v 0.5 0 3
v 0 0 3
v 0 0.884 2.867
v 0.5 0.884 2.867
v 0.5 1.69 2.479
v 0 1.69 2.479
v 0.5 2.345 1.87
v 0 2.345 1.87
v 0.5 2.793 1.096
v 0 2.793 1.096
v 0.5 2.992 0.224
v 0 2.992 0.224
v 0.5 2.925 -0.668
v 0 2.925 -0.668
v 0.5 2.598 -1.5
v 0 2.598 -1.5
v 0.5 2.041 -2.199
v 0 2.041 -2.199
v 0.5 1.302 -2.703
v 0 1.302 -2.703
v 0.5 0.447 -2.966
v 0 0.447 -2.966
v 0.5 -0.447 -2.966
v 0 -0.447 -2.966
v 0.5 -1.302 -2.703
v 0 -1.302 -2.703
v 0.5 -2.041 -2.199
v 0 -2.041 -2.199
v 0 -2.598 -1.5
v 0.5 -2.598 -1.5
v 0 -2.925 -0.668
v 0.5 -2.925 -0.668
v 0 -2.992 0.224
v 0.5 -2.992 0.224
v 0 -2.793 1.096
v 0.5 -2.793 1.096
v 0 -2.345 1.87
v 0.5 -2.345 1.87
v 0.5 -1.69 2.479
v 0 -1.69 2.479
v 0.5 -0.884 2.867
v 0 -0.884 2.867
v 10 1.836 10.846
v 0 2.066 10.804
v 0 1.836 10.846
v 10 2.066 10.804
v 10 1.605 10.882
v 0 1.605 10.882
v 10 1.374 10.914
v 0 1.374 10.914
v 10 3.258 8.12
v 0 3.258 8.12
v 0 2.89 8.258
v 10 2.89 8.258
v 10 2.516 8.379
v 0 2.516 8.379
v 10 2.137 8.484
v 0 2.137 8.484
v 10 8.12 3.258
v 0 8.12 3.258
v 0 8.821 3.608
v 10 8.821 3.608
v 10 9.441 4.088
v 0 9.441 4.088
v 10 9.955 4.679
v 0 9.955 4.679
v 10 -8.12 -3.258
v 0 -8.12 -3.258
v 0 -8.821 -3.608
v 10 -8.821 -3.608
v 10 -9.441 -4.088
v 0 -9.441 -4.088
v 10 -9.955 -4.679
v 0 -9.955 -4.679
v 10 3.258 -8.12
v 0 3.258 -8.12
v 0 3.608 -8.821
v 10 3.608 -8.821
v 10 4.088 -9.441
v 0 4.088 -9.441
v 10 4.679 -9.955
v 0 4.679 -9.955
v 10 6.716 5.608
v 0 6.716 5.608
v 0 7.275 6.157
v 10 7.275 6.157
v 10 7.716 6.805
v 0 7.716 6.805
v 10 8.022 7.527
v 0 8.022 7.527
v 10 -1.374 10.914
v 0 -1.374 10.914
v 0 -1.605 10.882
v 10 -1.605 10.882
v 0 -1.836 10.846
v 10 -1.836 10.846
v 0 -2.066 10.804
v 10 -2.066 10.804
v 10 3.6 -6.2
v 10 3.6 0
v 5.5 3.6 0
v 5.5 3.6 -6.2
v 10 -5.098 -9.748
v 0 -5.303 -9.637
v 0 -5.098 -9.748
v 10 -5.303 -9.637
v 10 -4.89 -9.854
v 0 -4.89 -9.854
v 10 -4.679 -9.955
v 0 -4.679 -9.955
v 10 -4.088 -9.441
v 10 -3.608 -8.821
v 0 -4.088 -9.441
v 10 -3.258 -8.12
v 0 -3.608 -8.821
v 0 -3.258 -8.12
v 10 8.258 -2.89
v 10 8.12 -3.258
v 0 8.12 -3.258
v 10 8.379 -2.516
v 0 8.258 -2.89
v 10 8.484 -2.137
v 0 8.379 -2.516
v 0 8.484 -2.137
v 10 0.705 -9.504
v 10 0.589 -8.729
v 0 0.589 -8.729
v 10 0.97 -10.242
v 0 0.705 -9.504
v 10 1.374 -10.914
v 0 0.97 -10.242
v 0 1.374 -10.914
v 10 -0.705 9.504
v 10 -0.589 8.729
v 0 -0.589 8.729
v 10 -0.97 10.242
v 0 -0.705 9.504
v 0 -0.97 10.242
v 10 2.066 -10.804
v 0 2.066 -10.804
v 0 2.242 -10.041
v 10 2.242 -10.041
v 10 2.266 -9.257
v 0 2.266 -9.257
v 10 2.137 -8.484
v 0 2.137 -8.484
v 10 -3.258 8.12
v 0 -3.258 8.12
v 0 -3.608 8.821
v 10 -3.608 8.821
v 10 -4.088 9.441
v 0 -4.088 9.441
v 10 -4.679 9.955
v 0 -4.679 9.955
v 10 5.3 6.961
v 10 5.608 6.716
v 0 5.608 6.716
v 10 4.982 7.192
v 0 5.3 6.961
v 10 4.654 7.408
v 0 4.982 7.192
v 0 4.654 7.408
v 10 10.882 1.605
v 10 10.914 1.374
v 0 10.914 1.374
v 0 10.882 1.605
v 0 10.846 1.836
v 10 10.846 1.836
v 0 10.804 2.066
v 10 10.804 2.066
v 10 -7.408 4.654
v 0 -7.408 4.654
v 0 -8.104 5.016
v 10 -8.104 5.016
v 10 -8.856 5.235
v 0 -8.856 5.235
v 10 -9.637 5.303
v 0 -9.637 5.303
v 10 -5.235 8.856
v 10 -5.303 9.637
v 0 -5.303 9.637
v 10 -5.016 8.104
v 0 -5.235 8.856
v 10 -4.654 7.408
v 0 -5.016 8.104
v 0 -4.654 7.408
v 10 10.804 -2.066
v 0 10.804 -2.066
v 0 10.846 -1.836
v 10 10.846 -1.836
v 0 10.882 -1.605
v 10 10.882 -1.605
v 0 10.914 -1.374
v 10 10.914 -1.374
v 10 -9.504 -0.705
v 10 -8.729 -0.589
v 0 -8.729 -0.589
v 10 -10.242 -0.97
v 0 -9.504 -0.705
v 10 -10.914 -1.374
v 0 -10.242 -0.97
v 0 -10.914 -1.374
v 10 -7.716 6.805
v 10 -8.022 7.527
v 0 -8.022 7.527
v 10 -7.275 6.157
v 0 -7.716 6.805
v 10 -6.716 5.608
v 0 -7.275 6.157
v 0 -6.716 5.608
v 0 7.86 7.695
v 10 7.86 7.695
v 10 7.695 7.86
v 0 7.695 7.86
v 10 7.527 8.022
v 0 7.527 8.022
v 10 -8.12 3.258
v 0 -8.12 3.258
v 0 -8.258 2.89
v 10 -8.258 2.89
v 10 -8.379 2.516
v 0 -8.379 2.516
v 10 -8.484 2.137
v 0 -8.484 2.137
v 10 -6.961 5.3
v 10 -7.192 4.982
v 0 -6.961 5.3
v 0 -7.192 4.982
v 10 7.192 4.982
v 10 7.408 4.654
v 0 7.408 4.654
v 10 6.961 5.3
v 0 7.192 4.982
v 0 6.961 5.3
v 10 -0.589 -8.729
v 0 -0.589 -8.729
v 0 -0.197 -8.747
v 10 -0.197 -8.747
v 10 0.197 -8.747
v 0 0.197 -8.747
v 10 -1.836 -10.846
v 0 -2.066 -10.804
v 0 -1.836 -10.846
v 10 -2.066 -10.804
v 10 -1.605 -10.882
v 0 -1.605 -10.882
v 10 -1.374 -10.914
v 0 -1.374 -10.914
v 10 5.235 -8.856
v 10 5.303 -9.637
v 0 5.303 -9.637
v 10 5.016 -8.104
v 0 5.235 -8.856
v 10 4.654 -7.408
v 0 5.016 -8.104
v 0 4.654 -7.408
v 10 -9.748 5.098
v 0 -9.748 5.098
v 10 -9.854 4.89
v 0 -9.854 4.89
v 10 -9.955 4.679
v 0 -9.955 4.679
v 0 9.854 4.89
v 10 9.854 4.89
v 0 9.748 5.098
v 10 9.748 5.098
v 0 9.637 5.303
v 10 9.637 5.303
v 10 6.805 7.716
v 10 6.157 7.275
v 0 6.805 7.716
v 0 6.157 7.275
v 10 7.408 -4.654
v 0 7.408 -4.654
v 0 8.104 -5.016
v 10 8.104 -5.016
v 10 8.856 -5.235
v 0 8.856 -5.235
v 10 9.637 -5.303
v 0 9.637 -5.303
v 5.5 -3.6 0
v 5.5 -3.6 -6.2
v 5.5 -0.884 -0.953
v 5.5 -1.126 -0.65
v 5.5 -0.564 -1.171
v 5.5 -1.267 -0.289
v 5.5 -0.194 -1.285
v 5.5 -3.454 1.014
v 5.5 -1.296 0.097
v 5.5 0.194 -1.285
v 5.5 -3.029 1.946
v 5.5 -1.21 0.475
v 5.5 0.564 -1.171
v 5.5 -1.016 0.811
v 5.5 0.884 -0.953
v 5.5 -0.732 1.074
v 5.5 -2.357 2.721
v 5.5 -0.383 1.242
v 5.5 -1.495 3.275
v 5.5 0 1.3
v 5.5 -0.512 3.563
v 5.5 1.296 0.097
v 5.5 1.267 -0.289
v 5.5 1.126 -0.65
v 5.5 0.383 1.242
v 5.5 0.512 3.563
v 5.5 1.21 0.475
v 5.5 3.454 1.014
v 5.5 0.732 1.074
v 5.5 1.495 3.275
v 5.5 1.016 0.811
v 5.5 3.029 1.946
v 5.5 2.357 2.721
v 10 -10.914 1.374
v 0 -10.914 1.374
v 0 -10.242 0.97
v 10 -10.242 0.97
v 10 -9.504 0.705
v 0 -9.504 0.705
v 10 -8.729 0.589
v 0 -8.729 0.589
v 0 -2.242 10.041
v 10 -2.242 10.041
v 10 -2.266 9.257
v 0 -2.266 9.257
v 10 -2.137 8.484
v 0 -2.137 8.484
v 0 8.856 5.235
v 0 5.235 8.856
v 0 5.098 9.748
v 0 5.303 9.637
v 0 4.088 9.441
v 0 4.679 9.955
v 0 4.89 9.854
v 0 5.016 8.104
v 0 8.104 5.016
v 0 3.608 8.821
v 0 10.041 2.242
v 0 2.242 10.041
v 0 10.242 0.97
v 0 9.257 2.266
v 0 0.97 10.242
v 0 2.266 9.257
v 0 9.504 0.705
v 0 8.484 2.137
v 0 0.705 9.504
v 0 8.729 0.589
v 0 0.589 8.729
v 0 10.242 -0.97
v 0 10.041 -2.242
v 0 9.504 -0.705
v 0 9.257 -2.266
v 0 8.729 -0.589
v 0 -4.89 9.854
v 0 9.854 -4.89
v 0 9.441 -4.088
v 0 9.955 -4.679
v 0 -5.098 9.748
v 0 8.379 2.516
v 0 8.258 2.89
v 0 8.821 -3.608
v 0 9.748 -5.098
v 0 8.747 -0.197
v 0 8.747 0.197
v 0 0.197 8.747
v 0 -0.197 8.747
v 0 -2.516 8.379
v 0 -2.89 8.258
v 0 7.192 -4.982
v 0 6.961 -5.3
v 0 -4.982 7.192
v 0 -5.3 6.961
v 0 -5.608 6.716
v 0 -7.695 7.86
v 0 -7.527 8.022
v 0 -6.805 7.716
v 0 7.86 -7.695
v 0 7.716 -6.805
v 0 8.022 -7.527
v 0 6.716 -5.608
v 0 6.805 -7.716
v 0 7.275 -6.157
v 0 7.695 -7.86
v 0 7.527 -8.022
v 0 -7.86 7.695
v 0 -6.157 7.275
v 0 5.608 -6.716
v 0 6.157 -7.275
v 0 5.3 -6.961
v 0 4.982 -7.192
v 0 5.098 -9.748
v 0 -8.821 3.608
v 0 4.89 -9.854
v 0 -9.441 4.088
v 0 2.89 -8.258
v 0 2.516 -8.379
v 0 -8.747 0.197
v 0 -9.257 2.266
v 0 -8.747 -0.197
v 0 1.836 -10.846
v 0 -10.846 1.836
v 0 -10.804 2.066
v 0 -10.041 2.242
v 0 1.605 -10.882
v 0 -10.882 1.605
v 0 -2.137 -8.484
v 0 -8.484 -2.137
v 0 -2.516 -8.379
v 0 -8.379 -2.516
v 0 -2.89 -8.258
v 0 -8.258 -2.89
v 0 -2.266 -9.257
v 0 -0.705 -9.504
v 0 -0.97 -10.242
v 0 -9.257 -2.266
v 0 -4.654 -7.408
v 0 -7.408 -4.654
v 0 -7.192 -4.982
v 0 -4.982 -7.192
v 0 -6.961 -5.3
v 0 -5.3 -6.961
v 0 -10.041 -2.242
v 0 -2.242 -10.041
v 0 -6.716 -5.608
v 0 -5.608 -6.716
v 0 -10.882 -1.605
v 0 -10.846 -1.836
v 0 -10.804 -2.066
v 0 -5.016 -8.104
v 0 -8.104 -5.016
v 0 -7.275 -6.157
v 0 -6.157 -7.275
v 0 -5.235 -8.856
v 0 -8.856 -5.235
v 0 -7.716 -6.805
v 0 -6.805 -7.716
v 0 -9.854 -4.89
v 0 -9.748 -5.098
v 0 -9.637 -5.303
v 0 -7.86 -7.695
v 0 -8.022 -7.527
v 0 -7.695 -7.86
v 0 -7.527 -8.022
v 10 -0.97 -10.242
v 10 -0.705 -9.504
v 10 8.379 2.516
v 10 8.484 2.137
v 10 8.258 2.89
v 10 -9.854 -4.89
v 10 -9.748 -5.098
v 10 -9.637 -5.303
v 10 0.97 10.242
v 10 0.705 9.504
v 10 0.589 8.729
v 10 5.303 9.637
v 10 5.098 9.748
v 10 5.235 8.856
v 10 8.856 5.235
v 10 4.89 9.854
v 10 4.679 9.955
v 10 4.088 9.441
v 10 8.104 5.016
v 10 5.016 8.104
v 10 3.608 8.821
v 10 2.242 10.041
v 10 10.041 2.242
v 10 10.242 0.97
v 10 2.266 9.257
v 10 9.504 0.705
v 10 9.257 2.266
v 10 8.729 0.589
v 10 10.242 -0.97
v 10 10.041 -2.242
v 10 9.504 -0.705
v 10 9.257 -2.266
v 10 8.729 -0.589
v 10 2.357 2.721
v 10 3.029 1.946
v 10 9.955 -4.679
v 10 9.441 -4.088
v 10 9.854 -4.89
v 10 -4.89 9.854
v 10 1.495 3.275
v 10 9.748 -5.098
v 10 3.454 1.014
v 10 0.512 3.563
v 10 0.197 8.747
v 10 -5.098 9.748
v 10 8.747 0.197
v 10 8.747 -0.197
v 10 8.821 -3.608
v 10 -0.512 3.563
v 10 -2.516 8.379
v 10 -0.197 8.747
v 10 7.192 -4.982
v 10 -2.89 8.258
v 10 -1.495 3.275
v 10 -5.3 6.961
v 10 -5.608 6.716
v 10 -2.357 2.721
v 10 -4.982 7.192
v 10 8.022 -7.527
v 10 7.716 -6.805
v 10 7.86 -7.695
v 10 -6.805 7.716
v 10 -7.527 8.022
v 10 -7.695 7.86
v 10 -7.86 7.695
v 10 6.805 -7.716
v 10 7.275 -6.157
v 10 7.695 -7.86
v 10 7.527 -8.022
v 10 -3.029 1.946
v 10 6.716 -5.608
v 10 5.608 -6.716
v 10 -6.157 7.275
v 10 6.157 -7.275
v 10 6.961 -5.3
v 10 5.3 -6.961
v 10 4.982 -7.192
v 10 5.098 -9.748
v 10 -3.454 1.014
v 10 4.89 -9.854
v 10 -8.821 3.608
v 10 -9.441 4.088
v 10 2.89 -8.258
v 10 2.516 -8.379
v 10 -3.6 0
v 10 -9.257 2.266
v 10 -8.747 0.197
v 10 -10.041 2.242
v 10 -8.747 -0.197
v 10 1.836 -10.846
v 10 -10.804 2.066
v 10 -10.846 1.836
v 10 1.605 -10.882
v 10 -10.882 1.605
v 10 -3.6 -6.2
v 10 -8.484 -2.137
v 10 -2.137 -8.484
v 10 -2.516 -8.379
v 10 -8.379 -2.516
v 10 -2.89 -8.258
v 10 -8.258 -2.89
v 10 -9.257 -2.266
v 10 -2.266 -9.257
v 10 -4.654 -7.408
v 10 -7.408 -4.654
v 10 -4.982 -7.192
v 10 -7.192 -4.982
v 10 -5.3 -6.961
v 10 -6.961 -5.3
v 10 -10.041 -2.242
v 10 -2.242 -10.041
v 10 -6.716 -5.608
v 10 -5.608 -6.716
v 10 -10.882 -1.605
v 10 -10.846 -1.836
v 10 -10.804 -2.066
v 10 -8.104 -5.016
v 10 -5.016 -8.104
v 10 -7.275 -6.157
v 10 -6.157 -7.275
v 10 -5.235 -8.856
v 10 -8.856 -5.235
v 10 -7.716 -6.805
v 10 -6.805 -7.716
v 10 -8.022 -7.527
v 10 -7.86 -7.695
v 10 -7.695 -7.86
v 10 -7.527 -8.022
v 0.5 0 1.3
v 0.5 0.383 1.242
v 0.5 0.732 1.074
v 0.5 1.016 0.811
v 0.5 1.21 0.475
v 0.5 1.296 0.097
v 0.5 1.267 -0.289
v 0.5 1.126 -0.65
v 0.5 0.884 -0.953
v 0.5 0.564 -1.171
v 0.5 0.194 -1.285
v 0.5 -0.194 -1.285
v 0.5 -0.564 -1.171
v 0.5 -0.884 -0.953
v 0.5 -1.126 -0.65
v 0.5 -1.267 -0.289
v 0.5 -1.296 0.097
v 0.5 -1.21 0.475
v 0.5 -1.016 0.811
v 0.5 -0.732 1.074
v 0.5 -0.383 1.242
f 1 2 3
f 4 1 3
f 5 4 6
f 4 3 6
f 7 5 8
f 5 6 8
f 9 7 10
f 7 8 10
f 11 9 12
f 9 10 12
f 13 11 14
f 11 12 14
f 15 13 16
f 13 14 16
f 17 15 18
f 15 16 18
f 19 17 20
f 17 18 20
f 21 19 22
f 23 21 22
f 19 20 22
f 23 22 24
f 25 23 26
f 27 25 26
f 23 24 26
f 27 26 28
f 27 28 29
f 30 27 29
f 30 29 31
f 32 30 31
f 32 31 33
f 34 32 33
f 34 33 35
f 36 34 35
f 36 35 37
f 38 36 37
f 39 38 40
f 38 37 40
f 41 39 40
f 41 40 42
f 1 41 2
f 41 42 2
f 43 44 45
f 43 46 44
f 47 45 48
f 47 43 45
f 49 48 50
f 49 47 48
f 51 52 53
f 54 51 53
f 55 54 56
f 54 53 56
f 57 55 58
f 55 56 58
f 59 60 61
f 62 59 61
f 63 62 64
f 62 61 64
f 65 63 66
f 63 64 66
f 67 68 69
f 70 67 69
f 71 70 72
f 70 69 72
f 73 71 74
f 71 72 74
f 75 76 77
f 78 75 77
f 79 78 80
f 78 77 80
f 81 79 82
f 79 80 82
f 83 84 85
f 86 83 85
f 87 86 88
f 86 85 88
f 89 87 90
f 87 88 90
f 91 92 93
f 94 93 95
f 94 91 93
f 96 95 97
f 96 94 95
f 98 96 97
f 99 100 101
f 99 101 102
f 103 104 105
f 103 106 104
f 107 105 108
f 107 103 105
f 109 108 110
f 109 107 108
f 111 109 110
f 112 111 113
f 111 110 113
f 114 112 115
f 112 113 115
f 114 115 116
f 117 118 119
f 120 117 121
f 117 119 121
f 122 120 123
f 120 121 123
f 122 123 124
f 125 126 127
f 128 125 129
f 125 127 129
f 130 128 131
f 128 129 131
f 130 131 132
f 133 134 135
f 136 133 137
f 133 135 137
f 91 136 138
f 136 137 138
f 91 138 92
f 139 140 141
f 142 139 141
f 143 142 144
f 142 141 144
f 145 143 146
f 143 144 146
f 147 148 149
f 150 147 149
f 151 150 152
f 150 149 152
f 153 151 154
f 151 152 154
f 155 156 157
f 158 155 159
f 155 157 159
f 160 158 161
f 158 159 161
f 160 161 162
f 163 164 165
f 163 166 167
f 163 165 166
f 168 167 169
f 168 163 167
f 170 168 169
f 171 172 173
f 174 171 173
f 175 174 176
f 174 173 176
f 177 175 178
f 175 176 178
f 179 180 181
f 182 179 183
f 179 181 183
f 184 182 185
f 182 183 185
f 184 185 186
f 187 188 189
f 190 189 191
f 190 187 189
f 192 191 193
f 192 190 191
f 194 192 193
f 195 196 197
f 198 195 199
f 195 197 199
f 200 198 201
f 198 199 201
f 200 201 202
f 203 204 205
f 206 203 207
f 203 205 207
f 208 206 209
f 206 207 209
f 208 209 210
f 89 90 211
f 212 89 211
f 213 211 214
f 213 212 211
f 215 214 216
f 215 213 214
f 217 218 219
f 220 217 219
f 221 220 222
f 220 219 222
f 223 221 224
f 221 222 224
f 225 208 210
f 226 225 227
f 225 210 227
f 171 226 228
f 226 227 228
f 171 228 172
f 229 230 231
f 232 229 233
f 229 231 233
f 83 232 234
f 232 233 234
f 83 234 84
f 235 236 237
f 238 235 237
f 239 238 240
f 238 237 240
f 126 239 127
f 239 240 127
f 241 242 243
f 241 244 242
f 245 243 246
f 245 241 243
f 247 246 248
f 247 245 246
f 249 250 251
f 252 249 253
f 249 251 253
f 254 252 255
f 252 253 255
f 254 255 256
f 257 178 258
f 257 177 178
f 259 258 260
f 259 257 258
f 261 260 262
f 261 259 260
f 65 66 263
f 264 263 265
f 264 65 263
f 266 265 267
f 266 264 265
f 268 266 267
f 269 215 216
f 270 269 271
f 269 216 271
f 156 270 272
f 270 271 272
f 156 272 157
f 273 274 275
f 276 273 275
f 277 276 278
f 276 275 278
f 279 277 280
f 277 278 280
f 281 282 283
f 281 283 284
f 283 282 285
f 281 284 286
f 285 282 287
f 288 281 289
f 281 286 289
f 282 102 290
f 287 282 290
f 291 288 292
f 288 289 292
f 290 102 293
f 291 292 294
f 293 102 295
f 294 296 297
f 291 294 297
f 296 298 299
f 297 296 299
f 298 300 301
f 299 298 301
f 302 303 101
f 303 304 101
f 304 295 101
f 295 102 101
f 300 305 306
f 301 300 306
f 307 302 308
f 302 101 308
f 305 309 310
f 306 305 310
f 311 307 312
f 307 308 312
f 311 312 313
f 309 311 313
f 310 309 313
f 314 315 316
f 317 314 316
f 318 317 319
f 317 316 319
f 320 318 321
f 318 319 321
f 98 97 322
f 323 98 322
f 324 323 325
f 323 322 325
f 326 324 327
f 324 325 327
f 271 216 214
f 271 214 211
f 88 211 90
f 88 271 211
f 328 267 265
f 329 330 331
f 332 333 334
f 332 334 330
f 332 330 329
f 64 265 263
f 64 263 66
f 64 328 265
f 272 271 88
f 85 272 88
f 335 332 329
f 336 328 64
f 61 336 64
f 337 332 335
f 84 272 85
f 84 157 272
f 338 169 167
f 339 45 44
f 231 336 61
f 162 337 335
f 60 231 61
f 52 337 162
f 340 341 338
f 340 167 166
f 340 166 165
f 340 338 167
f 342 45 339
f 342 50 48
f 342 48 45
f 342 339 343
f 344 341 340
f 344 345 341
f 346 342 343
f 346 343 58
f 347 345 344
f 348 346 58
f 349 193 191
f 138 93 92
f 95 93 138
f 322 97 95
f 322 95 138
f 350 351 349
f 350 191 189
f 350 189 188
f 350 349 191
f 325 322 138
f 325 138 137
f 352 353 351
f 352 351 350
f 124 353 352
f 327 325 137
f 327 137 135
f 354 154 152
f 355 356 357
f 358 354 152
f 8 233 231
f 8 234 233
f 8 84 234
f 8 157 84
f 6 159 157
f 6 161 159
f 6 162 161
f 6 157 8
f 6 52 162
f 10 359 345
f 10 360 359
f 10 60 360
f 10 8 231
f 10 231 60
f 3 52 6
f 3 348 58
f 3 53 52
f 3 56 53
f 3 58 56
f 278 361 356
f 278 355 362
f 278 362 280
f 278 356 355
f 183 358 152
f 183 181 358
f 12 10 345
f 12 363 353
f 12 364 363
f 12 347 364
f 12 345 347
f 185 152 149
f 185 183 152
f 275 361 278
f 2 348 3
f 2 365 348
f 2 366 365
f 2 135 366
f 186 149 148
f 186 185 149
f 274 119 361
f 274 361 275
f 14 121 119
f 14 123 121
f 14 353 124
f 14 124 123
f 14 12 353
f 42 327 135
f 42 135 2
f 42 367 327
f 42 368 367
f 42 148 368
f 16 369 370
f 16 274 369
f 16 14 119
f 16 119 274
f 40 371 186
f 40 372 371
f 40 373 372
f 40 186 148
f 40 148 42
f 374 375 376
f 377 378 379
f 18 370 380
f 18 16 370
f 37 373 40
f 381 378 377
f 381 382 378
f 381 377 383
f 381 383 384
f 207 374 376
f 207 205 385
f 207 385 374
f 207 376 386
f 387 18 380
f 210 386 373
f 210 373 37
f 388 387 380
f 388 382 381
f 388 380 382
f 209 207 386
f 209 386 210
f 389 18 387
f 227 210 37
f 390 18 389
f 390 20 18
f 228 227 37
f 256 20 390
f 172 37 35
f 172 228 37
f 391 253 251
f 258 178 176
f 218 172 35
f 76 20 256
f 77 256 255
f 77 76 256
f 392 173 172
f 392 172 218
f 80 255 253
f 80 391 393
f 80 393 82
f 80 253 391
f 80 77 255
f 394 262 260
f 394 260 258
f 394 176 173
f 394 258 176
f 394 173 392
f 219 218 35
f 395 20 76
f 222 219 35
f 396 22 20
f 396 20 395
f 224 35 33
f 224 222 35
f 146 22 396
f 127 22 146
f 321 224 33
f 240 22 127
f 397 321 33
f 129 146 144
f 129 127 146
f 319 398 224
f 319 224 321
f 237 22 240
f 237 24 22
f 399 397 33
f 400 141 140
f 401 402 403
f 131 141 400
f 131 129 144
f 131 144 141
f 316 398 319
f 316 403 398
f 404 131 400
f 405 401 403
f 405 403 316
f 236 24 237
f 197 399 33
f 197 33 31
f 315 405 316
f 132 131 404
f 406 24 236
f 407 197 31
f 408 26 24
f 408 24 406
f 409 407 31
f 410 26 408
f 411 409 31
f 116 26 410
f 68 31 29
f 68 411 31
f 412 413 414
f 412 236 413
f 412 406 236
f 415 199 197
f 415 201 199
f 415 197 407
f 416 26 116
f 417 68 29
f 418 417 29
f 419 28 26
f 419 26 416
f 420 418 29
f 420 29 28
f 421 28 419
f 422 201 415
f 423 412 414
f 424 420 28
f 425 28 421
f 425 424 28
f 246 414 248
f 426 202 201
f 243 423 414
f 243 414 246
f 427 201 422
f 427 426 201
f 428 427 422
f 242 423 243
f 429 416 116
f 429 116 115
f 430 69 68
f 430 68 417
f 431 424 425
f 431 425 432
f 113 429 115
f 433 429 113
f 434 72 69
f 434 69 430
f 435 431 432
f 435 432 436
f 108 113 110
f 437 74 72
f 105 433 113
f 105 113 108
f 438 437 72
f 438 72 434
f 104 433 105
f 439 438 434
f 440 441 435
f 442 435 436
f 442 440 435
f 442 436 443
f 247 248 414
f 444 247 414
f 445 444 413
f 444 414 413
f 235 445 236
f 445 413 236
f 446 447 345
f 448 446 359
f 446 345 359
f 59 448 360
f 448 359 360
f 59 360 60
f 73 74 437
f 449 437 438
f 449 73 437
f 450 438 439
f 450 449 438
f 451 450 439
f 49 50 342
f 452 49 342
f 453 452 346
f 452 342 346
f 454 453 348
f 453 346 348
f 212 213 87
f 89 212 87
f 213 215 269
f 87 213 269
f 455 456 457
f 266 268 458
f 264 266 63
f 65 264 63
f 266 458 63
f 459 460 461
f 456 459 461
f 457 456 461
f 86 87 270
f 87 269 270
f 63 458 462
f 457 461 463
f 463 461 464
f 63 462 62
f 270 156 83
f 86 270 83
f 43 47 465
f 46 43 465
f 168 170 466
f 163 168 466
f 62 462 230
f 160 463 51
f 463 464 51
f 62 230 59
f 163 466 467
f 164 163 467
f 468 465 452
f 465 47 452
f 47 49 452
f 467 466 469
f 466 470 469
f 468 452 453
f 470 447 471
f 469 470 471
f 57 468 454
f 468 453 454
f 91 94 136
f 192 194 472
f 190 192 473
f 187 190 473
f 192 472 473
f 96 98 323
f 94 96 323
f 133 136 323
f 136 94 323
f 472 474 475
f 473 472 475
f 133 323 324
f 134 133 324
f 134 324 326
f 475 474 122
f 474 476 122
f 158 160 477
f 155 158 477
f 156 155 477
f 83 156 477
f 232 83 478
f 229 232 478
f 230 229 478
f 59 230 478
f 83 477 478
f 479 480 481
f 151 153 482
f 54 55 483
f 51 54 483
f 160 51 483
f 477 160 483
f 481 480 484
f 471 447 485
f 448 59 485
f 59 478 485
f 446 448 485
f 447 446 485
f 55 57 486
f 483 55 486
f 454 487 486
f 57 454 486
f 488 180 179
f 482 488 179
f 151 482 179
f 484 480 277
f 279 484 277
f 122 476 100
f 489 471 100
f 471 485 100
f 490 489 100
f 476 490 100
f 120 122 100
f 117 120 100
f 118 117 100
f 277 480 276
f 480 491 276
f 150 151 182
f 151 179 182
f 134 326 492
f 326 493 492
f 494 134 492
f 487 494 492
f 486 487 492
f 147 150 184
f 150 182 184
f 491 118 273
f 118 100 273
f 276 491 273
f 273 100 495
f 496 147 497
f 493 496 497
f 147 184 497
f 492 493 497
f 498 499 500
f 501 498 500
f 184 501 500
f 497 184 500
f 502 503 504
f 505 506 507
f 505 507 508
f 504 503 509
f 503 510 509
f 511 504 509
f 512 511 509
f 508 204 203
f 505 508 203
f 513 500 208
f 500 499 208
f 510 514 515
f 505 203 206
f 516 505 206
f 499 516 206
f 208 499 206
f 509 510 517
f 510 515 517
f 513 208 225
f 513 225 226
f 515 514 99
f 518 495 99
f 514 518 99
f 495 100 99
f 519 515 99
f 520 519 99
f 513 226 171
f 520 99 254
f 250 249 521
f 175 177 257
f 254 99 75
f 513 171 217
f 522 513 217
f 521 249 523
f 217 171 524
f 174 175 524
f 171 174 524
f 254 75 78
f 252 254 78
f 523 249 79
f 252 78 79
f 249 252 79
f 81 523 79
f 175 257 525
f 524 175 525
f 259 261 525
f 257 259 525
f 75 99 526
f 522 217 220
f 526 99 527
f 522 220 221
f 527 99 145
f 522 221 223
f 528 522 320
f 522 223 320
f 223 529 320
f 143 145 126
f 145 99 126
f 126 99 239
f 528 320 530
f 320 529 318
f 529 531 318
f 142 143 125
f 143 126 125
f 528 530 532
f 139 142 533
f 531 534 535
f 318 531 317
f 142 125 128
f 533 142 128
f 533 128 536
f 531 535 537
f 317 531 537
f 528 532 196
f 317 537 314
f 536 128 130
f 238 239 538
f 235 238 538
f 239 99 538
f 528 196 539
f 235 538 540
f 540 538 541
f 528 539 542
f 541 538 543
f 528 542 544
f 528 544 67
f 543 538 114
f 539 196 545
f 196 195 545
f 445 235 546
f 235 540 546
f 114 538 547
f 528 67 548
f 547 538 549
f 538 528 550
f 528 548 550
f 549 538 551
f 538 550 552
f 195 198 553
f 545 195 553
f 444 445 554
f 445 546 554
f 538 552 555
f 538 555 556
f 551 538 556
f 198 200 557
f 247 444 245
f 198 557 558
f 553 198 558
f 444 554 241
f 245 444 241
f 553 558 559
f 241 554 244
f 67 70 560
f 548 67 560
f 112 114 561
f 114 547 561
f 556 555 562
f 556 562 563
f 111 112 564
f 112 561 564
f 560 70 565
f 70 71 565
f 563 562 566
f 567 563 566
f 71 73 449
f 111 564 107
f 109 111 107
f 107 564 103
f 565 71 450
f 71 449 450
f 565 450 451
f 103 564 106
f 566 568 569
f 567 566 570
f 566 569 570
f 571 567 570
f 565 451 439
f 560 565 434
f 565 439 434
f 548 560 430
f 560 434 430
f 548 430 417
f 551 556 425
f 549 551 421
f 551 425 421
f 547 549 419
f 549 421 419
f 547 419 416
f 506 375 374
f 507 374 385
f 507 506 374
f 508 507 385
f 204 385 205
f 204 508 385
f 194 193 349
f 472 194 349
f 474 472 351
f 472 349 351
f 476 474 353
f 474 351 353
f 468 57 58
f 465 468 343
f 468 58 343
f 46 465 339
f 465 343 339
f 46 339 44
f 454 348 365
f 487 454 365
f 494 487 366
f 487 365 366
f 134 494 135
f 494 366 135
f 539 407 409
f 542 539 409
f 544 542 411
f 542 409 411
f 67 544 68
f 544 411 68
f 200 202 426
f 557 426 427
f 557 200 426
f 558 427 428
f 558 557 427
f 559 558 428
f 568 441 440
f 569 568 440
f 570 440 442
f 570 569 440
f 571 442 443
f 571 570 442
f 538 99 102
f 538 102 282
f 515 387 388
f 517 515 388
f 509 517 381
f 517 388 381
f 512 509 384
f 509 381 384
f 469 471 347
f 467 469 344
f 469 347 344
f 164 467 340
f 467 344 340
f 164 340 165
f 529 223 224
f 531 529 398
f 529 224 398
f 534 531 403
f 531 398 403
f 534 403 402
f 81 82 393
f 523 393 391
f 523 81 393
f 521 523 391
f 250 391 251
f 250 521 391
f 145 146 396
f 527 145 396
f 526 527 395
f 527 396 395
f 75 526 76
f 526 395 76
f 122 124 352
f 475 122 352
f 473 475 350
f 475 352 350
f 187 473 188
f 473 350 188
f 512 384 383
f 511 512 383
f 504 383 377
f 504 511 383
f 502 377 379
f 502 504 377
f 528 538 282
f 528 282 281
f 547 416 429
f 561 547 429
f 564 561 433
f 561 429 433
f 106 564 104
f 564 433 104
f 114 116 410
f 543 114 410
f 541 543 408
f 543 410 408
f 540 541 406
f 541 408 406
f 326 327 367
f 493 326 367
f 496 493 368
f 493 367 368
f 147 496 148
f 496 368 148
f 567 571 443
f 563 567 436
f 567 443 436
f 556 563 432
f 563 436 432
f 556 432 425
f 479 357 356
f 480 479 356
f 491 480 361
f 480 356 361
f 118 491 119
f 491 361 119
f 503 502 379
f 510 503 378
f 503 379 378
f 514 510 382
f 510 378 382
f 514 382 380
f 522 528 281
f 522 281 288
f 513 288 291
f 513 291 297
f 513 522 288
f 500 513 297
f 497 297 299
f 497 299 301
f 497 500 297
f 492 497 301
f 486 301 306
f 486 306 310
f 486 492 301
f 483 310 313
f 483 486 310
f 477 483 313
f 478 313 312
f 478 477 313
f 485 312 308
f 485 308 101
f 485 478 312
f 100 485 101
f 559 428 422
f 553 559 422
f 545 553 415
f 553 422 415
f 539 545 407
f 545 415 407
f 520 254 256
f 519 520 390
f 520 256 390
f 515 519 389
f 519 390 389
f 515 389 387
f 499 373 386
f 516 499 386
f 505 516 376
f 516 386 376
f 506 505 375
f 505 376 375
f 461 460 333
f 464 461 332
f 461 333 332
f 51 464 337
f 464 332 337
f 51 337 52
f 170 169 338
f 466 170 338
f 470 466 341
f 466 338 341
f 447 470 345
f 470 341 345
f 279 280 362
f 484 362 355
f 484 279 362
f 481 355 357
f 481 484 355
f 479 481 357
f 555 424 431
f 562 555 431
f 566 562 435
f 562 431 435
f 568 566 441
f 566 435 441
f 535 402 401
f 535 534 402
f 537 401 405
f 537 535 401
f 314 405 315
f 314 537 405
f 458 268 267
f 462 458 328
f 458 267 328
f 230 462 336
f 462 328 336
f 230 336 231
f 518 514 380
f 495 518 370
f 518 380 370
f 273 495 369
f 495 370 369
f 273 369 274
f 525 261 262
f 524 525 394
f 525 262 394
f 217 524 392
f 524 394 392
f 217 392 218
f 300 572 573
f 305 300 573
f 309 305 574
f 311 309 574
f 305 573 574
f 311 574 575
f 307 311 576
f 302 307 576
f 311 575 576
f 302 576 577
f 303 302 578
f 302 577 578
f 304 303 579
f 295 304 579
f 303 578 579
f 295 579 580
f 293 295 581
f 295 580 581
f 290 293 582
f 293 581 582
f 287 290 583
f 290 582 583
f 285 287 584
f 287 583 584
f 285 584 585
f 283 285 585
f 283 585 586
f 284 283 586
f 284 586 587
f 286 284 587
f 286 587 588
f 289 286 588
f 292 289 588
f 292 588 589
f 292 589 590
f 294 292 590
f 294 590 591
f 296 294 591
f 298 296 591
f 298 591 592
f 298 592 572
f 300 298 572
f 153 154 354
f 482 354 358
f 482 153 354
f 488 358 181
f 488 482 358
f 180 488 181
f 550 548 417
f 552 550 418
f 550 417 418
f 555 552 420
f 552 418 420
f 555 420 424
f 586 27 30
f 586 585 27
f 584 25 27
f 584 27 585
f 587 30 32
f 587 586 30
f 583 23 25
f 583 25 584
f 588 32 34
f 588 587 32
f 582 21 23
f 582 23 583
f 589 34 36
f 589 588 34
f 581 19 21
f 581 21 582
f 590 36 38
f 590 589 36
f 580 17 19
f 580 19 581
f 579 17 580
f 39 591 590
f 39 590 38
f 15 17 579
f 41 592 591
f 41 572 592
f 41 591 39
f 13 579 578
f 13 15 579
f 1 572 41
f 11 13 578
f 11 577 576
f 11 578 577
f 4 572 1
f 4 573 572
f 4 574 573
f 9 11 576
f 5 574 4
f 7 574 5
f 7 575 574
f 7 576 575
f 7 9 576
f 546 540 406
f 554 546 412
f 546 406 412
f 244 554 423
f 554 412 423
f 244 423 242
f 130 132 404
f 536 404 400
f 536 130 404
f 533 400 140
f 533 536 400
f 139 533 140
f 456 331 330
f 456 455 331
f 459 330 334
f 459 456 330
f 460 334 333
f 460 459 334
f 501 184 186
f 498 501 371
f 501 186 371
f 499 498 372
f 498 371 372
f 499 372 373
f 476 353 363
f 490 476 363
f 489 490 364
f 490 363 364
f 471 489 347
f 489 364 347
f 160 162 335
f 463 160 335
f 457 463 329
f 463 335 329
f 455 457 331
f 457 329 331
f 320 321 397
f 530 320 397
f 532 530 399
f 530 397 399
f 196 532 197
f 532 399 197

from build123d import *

# Parameters (mm, degrees)
BASPROSKE_W        = 10
BASPROSKE_H        = 11
TOOTHCUT_DEPTH     = 19.493242009
TEETHCUTS_COUNT    = 20
TEETHCUTS_ANGLE    = 342
BORSKE_R           = 0.75
BORE_DEPTH         = 50.0000508
CUT_EXTRUDE1_DEPTH = 4.5
SKETCH2_R          = 1.3
CUT_EXTRUDE2_DEPTH = 10
SKETCH3_R          = 3
CUT_EXTRUDE3_DEPTH = 0.5


with BuildPart() as part:
    # BasProSke → Base-Revolve (revolve)
    with BuildSketch(Plane(origin=(0, 0, 0), x_dir=(1, 0, 0), z_dir=(0, 1, 0)), mode=Mode.PRIVATE) as base_revolve_sk:
        with Locations((5, 5.5)):
            Rectangle(BASPROSKE_W, BASPROSKE_H)
    revolve(base_revolve_sk.sketch.rotate(Axis((-10, 0, 0), (1, 0, 0)), 180), axis=Axis((-10, 0, 0), (1, 0, 0)))

    # TooCutSke → ToothCut (cut, through all)
    with BuildSketch(Plane(origin=(0, 0, 0), x_dir=(0, 0, -1), z_dir=(1, 0, 0))):
        with BuildLine():
            ThreePointArc((0.589353609, 8.729127295), (0, 8.749), (-0.589353609, 8.729127295))
            ThreePointArc((-0.589353609, 8.729127295), (-0.82475631, 9.893403384), (-1.391689312, 10.937213814))
            ThreePointArc((-1.391689312, 10.937213814), (0, 11.0254), (1.391689312, 10.937213814))
            ThreePointArc((1.391689312, 10.937213814), (0.82475631, 9.893403384), (0.589353609, 8.729127295))
        make_face()
    toothcut = extrude(amount=TOOTHCUT_DEPTH, mode=Mode.SUBTRACT)

    # TeethCuts: ToothCut ×20 about axis
    teethcuts_axis = Axis((-10, 0, 0), (1, 0, 0))
    for i in range(1, TEETHCUTS_COUNT):
        add(toothcut.rotate(teethcuts_axis, i * TEETHCUTS_ANGLE / (TEETHCUTS_COUNT - 1)), mode=Mode.SUBTRACT)

    # BorSke → Bore (cut, symmetric)
    with BuildSketch(Plane(origin=(0, 0, 0), x_dir=(0, 0, -1), z_dir=(1, 0, 0))):
        with Locations(Location((0, 0, 0), (0, 0, 180))):
            Circle(BORSKE_R)
    extrude(amount=BORE_DEPTH, both=True, mode=Mode.SUBTRACT)

    # Sketch1 → Cut-Extrude1 (cut)
    with BuildSketch(Plane(origin=(10, 0, 0), x_dir=(0, 0, -1), z_dir=(1, 0, 0))):
        with BuildLine():
            Line((0, 3.6), (6.2, 3.6))
            Line((6.2, 3.6), (6.2, -3.6))
            Line((6.2, -3.6), (0, -3.6))
            ThreePointArc((0, -3.6), (-3.6, 0), (0, 3.6))
        make_face()
    extrude(amount=-CUT_EXTRUDE1_DEPTH, mode=Mode.SUBTRACT)

    # Sketch2 → Cut-Extrude2 (cut)
    with BuildSketch(Plane.ZY):
        Circle(SKETCH2_R)
    extrude(amount=-CUT_EXTRUDE2_DEPTH, mode=Mode.SUBTRACT)

    # Sketch3 → Cut-Extrude3 (cut)
    with BuildSketch(Plane.ZY):
        Circle(SKETCH3_R)
    extrude(amount=-CUT_EXTRUDE3_DEPTH, mode=Mode.SUBTRACT)


solid = part.part
